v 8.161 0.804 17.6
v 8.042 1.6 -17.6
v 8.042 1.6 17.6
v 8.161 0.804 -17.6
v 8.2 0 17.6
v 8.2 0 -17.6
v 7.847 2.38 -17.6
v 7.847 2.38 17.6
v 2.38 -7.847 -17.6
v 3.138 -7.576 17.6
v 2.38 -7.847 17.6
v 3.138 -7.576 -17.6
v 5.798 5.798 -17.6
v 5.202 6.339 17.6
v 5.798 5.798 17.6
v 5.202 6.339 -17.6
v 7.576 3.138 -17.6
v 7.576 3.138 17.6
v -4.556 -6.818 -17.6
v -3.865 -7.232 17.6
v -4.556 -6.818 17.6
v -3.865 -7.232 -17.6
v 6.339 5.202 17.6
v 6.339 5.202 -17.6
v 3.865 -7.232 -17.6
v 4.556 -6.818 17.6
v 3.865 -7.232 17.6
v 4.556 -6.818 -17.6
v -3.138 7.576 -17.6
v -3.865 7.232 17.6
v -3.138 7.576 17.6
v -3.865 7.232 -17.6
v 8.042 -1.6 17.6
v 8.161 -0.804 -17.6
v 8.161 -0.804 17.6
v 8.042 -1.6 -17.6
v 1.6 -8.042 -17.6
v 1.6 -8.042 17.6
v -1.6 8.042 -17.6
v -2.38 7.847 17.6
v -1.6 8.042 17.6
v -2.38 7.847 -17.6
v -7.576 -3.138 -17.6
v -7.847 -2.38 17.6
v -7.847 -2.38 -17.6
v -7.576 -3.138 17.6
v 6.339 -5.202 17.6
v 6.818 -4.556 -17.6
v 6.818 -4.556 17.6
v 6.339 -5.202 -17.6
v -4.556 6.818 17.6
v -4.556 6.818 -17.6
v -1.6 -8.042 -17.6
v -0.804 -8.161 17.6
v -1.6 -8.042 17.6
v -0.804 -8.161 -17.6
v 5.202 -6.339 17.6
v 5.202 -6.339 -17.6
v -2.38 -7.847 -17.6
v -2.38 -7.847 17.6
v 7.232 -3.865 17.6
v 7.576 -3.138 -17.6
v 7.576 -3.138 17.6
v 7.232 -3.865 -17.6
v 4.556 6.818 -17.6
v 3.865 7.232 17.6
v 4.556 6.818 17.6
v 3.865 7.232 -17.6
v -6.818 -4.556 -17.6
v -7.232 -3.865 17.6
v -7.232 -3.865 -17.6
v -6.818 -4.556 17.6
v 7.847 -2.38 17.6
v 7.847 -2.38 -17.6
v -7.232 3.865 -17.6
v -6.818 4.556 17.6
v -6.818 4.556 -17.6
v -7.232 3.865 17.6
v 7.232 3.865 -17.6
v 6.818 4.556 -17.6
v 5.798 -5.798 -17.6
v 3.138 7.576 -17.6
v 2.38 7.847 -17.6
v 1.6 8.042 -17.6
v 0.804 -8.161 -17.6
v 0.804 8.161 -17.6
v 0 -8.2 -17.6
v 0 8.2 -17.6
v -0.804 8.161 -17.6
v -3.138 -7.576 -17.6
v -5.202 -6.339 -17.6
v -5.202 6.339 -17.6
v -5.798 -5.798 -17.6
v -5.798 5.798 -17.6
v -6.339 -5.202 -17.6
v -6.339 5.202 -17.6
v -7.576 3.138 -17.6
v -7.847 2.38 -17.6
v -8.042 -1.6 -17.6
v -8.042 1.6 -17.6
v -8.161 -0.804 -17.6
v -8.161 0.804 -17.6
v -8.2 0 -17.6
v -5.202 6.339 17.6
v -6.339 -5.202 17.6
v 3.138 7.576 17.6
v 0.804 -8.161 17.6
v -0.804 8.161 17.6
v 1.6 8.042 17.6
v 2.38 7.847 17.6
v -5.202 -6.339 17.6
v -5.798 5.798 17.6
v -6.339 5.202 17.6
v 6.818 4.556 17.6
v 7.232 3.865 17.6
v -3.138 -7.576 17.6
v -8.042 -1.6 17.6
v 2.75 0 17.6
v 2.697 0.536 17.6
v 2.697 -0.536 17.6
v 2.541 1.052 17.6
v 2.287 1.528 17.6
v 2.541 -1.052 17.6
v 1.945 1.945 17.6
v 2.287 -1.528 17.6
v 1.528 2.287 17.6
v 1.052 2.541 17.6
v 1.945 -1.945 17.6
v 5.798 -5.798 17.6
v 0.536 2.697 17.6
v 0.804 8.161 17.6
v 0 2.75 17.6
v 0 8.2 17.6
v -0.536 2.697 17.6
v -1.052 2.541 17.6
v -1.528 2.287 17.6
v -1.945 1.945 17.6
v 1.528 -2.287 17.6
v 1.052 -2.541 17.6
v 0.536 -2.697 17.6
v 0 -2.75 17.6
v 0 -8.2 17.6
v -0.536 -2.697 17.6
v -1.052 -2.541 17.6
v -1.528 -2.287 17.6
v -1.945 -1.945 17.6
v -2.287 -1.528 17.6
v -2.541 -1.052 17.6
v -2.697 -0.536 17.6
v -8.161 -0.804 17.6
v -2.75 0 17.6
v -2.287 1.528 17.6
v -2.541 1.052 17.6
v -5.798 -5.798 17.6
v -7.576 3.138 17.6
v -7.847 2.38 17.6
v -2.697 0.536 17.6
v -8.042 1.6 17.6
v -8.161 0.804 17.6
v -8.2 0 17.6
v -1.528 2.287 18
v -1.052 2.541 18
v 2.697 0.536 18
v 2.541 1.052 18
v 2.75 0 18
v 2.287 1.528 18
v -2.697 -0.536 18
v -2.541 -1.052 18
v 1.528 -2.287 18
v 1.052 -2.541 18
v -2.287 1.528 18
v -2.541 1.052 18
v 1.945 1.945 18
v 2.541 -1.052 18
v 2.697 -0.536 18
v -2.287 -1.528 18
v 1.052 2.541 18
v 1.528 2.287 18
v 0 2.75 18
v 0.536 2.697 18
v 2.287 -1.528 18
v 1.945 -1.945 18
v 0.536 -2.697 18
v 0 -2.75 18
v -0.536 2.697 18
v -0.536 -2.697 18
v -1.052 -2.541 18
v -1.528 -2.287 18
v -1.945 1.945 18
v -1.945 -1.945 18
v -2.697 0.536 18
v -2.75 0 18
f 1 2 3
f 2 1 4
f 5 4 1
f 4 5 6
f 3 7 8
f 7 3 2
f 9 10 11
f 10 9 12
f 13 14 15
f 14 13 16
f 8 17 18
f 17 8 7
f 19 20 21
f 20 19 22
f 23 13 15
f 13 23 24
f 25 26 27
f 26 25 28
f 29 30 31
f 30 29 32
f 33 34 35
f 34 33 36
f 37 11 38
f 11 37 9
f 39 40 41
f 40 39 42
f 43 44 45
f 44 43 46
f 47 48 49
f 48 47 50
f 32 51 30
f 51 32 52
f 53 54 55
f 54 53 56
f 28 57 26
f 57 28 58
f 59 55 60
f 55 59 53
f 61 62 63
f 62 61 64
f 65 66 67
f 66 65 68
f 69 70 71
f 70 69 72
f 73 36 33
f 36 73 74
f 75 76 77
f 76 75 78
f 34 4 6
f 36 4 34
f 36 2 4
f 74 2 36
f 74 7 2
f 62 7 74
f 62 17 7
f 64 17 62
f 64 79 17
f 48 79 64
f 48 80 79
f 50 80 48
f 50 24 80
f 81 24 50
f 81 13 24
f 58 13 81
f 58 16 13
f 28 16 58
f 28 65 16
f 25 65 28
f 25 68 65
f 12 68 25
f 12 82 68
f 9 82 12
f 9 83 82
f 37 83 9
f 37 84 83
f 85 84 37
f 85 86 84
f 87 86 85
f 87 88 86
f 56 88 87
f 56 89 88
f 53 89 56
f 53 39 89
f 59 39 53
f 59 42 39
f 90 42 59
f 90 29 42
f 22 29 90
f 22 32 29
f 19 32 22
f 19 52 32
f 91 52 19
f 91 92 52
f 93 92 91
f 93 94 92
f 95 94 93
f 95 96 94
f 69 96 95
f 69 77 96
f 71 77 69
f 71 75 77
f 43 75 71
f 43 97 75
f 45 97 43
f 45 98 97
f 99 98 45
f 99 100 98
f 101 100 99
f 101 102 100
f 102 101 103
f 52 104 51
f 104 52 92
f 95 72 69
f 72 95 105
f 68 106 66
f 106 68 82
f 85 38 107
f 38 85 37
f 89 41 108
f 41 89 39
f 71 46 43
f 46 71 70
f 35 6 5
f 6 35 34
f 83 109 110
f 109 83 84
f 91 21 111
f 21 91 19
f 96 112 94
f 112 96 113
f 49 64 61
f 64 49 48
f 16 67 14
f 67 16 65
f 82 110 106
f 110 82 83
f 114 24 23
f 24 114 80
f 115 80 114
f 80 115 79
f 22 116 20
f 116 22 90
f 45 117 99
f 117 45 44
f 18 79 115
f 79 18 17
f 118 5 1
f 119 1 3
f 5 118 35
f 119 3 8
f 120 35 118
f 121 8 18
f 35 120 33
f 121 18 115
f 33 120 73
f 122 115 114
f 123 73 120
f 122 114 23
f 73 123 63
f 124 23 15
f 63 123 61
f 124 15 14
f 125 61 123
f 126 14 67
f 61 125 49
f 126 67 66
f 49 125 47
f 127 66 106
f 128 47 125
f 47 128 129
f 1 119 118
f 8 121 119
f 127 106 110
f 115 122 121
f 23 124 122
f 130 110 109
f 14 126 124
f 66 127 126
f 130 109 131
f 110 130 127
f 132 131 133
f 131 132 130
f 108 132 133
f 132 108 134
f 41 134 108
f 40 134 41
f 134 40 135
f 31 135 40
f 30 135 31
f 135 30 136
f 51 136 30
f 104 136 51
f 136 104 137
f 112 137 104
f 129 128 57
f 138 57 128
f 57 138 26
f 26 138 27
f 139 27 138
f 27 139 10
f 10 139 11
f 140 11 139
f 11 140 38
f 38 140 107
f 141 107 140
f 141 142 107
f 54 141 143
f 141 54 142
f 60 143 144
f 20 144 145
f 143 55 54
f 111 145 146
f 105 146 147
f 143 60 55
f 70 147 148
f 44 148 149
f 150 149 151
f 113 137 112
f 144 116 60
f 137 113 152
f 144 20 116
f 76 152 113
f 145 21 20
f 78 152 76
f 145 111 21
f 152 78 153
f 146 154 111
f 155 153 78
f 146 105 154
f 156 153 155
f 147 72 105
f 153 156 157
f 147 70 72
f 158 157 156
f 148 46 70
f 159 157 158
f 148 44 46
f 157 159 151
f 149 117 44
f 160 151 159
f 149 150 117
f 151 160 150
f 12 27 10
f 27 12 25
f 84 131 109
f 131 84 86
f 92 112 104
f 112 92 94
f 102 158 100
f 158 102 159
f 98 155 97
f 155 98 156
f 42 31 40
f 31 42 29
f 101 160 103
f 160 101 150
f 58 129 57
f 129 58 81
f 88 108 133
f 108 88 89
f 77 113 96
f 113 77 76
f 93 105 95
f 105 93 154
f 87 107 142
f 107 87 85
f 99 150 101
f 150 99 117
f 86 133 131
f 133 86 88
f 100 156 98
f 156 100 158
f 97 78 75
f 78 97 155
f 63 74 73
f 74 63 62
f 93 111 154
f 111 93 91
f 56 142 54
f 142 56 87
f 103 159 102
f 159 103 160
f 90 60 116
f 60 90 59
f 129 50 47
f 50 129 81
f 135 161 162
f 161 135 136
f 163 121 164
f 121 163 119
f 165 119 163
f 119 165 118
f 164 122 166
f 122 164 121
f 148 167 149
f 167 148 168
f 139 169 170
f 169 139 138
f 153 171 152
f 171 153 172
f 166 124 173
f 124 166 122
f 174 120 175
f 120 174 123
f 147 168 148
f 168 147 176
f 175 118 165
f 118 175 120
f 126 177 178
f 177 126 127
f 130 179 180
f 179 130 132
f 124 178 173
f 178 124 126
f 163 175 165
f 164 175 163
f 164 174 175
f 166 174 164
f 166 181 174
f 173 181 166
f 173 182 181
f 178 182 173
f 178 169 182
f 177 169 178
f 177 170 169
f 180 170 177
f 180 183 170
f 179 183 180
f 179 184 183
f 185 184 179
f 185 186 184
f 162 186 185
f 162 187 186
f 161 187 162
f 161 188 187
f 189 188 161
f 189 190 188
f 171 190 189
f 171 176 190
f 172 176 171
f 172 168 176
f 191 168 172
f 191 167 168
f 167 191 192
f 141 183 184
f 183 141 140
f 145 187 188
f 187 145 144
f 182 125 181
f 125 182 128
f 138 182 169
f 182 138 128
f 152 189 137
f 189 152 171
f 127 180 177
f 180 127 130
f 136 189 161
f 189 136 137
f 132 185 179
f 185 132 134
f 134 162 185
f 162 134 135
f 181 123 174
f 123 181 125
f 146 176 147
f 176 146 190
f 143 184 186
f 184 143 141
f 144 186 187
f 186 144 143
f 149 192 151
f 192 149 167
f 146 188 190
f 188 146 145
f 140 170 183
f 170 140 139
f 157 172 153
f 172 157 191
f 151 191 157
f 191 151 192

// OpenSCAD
// Parameters
height_mm = 35.2; //[17.6:70.4:0.1]
diameter_mm = 16.4; //[8.2:32.8:0.1]
positive_terminal_diameter_mm = 5.5; //[2.75:11:0.1]
positive_terminal_height_mm = 1.2; //[0.6:2.4:0.1]
negative_terminal_diameter_mm = 6; //[3:12:0.1]
negative_terminal_height_mm = 0.3; //[0.15:0.6:0.05]
terminal_overlap_mm = 0.8; //[0.5:2:0.1]

// Battery - complete geometry
module battery() {
  union() {
    // Main cylindrical body
    color("DimGray") {
      translate([0, 0, 0])
        cylinder(h=height_mm, r=diameter_mm/2, center=true, $fn=64);
    }
    // Positive terminal button
    color("Silver") {
      translate([0, 0, height_mm/2 + positive_terminal_height_mm/2 - terminal_overlap_mm])
        cylinder(h=positive_terminal_height_mm, r=positive_terminal_diameter_mm/2, center=true, $fn=32);
    }
    // Negative terminal contact
    color("Silver") {
      translate([0, 0, -height_mm/2 - negative_terminal_height_mm/2 + terminal_overlap_mm])
        cylinder(h=negative_terminal_height_mm, r=negative_terminal_diameter_mm/2, center=true, $fn=32);
    }
  }
}

// Assembly
module assembly() {
  battery();
}

assembly();
